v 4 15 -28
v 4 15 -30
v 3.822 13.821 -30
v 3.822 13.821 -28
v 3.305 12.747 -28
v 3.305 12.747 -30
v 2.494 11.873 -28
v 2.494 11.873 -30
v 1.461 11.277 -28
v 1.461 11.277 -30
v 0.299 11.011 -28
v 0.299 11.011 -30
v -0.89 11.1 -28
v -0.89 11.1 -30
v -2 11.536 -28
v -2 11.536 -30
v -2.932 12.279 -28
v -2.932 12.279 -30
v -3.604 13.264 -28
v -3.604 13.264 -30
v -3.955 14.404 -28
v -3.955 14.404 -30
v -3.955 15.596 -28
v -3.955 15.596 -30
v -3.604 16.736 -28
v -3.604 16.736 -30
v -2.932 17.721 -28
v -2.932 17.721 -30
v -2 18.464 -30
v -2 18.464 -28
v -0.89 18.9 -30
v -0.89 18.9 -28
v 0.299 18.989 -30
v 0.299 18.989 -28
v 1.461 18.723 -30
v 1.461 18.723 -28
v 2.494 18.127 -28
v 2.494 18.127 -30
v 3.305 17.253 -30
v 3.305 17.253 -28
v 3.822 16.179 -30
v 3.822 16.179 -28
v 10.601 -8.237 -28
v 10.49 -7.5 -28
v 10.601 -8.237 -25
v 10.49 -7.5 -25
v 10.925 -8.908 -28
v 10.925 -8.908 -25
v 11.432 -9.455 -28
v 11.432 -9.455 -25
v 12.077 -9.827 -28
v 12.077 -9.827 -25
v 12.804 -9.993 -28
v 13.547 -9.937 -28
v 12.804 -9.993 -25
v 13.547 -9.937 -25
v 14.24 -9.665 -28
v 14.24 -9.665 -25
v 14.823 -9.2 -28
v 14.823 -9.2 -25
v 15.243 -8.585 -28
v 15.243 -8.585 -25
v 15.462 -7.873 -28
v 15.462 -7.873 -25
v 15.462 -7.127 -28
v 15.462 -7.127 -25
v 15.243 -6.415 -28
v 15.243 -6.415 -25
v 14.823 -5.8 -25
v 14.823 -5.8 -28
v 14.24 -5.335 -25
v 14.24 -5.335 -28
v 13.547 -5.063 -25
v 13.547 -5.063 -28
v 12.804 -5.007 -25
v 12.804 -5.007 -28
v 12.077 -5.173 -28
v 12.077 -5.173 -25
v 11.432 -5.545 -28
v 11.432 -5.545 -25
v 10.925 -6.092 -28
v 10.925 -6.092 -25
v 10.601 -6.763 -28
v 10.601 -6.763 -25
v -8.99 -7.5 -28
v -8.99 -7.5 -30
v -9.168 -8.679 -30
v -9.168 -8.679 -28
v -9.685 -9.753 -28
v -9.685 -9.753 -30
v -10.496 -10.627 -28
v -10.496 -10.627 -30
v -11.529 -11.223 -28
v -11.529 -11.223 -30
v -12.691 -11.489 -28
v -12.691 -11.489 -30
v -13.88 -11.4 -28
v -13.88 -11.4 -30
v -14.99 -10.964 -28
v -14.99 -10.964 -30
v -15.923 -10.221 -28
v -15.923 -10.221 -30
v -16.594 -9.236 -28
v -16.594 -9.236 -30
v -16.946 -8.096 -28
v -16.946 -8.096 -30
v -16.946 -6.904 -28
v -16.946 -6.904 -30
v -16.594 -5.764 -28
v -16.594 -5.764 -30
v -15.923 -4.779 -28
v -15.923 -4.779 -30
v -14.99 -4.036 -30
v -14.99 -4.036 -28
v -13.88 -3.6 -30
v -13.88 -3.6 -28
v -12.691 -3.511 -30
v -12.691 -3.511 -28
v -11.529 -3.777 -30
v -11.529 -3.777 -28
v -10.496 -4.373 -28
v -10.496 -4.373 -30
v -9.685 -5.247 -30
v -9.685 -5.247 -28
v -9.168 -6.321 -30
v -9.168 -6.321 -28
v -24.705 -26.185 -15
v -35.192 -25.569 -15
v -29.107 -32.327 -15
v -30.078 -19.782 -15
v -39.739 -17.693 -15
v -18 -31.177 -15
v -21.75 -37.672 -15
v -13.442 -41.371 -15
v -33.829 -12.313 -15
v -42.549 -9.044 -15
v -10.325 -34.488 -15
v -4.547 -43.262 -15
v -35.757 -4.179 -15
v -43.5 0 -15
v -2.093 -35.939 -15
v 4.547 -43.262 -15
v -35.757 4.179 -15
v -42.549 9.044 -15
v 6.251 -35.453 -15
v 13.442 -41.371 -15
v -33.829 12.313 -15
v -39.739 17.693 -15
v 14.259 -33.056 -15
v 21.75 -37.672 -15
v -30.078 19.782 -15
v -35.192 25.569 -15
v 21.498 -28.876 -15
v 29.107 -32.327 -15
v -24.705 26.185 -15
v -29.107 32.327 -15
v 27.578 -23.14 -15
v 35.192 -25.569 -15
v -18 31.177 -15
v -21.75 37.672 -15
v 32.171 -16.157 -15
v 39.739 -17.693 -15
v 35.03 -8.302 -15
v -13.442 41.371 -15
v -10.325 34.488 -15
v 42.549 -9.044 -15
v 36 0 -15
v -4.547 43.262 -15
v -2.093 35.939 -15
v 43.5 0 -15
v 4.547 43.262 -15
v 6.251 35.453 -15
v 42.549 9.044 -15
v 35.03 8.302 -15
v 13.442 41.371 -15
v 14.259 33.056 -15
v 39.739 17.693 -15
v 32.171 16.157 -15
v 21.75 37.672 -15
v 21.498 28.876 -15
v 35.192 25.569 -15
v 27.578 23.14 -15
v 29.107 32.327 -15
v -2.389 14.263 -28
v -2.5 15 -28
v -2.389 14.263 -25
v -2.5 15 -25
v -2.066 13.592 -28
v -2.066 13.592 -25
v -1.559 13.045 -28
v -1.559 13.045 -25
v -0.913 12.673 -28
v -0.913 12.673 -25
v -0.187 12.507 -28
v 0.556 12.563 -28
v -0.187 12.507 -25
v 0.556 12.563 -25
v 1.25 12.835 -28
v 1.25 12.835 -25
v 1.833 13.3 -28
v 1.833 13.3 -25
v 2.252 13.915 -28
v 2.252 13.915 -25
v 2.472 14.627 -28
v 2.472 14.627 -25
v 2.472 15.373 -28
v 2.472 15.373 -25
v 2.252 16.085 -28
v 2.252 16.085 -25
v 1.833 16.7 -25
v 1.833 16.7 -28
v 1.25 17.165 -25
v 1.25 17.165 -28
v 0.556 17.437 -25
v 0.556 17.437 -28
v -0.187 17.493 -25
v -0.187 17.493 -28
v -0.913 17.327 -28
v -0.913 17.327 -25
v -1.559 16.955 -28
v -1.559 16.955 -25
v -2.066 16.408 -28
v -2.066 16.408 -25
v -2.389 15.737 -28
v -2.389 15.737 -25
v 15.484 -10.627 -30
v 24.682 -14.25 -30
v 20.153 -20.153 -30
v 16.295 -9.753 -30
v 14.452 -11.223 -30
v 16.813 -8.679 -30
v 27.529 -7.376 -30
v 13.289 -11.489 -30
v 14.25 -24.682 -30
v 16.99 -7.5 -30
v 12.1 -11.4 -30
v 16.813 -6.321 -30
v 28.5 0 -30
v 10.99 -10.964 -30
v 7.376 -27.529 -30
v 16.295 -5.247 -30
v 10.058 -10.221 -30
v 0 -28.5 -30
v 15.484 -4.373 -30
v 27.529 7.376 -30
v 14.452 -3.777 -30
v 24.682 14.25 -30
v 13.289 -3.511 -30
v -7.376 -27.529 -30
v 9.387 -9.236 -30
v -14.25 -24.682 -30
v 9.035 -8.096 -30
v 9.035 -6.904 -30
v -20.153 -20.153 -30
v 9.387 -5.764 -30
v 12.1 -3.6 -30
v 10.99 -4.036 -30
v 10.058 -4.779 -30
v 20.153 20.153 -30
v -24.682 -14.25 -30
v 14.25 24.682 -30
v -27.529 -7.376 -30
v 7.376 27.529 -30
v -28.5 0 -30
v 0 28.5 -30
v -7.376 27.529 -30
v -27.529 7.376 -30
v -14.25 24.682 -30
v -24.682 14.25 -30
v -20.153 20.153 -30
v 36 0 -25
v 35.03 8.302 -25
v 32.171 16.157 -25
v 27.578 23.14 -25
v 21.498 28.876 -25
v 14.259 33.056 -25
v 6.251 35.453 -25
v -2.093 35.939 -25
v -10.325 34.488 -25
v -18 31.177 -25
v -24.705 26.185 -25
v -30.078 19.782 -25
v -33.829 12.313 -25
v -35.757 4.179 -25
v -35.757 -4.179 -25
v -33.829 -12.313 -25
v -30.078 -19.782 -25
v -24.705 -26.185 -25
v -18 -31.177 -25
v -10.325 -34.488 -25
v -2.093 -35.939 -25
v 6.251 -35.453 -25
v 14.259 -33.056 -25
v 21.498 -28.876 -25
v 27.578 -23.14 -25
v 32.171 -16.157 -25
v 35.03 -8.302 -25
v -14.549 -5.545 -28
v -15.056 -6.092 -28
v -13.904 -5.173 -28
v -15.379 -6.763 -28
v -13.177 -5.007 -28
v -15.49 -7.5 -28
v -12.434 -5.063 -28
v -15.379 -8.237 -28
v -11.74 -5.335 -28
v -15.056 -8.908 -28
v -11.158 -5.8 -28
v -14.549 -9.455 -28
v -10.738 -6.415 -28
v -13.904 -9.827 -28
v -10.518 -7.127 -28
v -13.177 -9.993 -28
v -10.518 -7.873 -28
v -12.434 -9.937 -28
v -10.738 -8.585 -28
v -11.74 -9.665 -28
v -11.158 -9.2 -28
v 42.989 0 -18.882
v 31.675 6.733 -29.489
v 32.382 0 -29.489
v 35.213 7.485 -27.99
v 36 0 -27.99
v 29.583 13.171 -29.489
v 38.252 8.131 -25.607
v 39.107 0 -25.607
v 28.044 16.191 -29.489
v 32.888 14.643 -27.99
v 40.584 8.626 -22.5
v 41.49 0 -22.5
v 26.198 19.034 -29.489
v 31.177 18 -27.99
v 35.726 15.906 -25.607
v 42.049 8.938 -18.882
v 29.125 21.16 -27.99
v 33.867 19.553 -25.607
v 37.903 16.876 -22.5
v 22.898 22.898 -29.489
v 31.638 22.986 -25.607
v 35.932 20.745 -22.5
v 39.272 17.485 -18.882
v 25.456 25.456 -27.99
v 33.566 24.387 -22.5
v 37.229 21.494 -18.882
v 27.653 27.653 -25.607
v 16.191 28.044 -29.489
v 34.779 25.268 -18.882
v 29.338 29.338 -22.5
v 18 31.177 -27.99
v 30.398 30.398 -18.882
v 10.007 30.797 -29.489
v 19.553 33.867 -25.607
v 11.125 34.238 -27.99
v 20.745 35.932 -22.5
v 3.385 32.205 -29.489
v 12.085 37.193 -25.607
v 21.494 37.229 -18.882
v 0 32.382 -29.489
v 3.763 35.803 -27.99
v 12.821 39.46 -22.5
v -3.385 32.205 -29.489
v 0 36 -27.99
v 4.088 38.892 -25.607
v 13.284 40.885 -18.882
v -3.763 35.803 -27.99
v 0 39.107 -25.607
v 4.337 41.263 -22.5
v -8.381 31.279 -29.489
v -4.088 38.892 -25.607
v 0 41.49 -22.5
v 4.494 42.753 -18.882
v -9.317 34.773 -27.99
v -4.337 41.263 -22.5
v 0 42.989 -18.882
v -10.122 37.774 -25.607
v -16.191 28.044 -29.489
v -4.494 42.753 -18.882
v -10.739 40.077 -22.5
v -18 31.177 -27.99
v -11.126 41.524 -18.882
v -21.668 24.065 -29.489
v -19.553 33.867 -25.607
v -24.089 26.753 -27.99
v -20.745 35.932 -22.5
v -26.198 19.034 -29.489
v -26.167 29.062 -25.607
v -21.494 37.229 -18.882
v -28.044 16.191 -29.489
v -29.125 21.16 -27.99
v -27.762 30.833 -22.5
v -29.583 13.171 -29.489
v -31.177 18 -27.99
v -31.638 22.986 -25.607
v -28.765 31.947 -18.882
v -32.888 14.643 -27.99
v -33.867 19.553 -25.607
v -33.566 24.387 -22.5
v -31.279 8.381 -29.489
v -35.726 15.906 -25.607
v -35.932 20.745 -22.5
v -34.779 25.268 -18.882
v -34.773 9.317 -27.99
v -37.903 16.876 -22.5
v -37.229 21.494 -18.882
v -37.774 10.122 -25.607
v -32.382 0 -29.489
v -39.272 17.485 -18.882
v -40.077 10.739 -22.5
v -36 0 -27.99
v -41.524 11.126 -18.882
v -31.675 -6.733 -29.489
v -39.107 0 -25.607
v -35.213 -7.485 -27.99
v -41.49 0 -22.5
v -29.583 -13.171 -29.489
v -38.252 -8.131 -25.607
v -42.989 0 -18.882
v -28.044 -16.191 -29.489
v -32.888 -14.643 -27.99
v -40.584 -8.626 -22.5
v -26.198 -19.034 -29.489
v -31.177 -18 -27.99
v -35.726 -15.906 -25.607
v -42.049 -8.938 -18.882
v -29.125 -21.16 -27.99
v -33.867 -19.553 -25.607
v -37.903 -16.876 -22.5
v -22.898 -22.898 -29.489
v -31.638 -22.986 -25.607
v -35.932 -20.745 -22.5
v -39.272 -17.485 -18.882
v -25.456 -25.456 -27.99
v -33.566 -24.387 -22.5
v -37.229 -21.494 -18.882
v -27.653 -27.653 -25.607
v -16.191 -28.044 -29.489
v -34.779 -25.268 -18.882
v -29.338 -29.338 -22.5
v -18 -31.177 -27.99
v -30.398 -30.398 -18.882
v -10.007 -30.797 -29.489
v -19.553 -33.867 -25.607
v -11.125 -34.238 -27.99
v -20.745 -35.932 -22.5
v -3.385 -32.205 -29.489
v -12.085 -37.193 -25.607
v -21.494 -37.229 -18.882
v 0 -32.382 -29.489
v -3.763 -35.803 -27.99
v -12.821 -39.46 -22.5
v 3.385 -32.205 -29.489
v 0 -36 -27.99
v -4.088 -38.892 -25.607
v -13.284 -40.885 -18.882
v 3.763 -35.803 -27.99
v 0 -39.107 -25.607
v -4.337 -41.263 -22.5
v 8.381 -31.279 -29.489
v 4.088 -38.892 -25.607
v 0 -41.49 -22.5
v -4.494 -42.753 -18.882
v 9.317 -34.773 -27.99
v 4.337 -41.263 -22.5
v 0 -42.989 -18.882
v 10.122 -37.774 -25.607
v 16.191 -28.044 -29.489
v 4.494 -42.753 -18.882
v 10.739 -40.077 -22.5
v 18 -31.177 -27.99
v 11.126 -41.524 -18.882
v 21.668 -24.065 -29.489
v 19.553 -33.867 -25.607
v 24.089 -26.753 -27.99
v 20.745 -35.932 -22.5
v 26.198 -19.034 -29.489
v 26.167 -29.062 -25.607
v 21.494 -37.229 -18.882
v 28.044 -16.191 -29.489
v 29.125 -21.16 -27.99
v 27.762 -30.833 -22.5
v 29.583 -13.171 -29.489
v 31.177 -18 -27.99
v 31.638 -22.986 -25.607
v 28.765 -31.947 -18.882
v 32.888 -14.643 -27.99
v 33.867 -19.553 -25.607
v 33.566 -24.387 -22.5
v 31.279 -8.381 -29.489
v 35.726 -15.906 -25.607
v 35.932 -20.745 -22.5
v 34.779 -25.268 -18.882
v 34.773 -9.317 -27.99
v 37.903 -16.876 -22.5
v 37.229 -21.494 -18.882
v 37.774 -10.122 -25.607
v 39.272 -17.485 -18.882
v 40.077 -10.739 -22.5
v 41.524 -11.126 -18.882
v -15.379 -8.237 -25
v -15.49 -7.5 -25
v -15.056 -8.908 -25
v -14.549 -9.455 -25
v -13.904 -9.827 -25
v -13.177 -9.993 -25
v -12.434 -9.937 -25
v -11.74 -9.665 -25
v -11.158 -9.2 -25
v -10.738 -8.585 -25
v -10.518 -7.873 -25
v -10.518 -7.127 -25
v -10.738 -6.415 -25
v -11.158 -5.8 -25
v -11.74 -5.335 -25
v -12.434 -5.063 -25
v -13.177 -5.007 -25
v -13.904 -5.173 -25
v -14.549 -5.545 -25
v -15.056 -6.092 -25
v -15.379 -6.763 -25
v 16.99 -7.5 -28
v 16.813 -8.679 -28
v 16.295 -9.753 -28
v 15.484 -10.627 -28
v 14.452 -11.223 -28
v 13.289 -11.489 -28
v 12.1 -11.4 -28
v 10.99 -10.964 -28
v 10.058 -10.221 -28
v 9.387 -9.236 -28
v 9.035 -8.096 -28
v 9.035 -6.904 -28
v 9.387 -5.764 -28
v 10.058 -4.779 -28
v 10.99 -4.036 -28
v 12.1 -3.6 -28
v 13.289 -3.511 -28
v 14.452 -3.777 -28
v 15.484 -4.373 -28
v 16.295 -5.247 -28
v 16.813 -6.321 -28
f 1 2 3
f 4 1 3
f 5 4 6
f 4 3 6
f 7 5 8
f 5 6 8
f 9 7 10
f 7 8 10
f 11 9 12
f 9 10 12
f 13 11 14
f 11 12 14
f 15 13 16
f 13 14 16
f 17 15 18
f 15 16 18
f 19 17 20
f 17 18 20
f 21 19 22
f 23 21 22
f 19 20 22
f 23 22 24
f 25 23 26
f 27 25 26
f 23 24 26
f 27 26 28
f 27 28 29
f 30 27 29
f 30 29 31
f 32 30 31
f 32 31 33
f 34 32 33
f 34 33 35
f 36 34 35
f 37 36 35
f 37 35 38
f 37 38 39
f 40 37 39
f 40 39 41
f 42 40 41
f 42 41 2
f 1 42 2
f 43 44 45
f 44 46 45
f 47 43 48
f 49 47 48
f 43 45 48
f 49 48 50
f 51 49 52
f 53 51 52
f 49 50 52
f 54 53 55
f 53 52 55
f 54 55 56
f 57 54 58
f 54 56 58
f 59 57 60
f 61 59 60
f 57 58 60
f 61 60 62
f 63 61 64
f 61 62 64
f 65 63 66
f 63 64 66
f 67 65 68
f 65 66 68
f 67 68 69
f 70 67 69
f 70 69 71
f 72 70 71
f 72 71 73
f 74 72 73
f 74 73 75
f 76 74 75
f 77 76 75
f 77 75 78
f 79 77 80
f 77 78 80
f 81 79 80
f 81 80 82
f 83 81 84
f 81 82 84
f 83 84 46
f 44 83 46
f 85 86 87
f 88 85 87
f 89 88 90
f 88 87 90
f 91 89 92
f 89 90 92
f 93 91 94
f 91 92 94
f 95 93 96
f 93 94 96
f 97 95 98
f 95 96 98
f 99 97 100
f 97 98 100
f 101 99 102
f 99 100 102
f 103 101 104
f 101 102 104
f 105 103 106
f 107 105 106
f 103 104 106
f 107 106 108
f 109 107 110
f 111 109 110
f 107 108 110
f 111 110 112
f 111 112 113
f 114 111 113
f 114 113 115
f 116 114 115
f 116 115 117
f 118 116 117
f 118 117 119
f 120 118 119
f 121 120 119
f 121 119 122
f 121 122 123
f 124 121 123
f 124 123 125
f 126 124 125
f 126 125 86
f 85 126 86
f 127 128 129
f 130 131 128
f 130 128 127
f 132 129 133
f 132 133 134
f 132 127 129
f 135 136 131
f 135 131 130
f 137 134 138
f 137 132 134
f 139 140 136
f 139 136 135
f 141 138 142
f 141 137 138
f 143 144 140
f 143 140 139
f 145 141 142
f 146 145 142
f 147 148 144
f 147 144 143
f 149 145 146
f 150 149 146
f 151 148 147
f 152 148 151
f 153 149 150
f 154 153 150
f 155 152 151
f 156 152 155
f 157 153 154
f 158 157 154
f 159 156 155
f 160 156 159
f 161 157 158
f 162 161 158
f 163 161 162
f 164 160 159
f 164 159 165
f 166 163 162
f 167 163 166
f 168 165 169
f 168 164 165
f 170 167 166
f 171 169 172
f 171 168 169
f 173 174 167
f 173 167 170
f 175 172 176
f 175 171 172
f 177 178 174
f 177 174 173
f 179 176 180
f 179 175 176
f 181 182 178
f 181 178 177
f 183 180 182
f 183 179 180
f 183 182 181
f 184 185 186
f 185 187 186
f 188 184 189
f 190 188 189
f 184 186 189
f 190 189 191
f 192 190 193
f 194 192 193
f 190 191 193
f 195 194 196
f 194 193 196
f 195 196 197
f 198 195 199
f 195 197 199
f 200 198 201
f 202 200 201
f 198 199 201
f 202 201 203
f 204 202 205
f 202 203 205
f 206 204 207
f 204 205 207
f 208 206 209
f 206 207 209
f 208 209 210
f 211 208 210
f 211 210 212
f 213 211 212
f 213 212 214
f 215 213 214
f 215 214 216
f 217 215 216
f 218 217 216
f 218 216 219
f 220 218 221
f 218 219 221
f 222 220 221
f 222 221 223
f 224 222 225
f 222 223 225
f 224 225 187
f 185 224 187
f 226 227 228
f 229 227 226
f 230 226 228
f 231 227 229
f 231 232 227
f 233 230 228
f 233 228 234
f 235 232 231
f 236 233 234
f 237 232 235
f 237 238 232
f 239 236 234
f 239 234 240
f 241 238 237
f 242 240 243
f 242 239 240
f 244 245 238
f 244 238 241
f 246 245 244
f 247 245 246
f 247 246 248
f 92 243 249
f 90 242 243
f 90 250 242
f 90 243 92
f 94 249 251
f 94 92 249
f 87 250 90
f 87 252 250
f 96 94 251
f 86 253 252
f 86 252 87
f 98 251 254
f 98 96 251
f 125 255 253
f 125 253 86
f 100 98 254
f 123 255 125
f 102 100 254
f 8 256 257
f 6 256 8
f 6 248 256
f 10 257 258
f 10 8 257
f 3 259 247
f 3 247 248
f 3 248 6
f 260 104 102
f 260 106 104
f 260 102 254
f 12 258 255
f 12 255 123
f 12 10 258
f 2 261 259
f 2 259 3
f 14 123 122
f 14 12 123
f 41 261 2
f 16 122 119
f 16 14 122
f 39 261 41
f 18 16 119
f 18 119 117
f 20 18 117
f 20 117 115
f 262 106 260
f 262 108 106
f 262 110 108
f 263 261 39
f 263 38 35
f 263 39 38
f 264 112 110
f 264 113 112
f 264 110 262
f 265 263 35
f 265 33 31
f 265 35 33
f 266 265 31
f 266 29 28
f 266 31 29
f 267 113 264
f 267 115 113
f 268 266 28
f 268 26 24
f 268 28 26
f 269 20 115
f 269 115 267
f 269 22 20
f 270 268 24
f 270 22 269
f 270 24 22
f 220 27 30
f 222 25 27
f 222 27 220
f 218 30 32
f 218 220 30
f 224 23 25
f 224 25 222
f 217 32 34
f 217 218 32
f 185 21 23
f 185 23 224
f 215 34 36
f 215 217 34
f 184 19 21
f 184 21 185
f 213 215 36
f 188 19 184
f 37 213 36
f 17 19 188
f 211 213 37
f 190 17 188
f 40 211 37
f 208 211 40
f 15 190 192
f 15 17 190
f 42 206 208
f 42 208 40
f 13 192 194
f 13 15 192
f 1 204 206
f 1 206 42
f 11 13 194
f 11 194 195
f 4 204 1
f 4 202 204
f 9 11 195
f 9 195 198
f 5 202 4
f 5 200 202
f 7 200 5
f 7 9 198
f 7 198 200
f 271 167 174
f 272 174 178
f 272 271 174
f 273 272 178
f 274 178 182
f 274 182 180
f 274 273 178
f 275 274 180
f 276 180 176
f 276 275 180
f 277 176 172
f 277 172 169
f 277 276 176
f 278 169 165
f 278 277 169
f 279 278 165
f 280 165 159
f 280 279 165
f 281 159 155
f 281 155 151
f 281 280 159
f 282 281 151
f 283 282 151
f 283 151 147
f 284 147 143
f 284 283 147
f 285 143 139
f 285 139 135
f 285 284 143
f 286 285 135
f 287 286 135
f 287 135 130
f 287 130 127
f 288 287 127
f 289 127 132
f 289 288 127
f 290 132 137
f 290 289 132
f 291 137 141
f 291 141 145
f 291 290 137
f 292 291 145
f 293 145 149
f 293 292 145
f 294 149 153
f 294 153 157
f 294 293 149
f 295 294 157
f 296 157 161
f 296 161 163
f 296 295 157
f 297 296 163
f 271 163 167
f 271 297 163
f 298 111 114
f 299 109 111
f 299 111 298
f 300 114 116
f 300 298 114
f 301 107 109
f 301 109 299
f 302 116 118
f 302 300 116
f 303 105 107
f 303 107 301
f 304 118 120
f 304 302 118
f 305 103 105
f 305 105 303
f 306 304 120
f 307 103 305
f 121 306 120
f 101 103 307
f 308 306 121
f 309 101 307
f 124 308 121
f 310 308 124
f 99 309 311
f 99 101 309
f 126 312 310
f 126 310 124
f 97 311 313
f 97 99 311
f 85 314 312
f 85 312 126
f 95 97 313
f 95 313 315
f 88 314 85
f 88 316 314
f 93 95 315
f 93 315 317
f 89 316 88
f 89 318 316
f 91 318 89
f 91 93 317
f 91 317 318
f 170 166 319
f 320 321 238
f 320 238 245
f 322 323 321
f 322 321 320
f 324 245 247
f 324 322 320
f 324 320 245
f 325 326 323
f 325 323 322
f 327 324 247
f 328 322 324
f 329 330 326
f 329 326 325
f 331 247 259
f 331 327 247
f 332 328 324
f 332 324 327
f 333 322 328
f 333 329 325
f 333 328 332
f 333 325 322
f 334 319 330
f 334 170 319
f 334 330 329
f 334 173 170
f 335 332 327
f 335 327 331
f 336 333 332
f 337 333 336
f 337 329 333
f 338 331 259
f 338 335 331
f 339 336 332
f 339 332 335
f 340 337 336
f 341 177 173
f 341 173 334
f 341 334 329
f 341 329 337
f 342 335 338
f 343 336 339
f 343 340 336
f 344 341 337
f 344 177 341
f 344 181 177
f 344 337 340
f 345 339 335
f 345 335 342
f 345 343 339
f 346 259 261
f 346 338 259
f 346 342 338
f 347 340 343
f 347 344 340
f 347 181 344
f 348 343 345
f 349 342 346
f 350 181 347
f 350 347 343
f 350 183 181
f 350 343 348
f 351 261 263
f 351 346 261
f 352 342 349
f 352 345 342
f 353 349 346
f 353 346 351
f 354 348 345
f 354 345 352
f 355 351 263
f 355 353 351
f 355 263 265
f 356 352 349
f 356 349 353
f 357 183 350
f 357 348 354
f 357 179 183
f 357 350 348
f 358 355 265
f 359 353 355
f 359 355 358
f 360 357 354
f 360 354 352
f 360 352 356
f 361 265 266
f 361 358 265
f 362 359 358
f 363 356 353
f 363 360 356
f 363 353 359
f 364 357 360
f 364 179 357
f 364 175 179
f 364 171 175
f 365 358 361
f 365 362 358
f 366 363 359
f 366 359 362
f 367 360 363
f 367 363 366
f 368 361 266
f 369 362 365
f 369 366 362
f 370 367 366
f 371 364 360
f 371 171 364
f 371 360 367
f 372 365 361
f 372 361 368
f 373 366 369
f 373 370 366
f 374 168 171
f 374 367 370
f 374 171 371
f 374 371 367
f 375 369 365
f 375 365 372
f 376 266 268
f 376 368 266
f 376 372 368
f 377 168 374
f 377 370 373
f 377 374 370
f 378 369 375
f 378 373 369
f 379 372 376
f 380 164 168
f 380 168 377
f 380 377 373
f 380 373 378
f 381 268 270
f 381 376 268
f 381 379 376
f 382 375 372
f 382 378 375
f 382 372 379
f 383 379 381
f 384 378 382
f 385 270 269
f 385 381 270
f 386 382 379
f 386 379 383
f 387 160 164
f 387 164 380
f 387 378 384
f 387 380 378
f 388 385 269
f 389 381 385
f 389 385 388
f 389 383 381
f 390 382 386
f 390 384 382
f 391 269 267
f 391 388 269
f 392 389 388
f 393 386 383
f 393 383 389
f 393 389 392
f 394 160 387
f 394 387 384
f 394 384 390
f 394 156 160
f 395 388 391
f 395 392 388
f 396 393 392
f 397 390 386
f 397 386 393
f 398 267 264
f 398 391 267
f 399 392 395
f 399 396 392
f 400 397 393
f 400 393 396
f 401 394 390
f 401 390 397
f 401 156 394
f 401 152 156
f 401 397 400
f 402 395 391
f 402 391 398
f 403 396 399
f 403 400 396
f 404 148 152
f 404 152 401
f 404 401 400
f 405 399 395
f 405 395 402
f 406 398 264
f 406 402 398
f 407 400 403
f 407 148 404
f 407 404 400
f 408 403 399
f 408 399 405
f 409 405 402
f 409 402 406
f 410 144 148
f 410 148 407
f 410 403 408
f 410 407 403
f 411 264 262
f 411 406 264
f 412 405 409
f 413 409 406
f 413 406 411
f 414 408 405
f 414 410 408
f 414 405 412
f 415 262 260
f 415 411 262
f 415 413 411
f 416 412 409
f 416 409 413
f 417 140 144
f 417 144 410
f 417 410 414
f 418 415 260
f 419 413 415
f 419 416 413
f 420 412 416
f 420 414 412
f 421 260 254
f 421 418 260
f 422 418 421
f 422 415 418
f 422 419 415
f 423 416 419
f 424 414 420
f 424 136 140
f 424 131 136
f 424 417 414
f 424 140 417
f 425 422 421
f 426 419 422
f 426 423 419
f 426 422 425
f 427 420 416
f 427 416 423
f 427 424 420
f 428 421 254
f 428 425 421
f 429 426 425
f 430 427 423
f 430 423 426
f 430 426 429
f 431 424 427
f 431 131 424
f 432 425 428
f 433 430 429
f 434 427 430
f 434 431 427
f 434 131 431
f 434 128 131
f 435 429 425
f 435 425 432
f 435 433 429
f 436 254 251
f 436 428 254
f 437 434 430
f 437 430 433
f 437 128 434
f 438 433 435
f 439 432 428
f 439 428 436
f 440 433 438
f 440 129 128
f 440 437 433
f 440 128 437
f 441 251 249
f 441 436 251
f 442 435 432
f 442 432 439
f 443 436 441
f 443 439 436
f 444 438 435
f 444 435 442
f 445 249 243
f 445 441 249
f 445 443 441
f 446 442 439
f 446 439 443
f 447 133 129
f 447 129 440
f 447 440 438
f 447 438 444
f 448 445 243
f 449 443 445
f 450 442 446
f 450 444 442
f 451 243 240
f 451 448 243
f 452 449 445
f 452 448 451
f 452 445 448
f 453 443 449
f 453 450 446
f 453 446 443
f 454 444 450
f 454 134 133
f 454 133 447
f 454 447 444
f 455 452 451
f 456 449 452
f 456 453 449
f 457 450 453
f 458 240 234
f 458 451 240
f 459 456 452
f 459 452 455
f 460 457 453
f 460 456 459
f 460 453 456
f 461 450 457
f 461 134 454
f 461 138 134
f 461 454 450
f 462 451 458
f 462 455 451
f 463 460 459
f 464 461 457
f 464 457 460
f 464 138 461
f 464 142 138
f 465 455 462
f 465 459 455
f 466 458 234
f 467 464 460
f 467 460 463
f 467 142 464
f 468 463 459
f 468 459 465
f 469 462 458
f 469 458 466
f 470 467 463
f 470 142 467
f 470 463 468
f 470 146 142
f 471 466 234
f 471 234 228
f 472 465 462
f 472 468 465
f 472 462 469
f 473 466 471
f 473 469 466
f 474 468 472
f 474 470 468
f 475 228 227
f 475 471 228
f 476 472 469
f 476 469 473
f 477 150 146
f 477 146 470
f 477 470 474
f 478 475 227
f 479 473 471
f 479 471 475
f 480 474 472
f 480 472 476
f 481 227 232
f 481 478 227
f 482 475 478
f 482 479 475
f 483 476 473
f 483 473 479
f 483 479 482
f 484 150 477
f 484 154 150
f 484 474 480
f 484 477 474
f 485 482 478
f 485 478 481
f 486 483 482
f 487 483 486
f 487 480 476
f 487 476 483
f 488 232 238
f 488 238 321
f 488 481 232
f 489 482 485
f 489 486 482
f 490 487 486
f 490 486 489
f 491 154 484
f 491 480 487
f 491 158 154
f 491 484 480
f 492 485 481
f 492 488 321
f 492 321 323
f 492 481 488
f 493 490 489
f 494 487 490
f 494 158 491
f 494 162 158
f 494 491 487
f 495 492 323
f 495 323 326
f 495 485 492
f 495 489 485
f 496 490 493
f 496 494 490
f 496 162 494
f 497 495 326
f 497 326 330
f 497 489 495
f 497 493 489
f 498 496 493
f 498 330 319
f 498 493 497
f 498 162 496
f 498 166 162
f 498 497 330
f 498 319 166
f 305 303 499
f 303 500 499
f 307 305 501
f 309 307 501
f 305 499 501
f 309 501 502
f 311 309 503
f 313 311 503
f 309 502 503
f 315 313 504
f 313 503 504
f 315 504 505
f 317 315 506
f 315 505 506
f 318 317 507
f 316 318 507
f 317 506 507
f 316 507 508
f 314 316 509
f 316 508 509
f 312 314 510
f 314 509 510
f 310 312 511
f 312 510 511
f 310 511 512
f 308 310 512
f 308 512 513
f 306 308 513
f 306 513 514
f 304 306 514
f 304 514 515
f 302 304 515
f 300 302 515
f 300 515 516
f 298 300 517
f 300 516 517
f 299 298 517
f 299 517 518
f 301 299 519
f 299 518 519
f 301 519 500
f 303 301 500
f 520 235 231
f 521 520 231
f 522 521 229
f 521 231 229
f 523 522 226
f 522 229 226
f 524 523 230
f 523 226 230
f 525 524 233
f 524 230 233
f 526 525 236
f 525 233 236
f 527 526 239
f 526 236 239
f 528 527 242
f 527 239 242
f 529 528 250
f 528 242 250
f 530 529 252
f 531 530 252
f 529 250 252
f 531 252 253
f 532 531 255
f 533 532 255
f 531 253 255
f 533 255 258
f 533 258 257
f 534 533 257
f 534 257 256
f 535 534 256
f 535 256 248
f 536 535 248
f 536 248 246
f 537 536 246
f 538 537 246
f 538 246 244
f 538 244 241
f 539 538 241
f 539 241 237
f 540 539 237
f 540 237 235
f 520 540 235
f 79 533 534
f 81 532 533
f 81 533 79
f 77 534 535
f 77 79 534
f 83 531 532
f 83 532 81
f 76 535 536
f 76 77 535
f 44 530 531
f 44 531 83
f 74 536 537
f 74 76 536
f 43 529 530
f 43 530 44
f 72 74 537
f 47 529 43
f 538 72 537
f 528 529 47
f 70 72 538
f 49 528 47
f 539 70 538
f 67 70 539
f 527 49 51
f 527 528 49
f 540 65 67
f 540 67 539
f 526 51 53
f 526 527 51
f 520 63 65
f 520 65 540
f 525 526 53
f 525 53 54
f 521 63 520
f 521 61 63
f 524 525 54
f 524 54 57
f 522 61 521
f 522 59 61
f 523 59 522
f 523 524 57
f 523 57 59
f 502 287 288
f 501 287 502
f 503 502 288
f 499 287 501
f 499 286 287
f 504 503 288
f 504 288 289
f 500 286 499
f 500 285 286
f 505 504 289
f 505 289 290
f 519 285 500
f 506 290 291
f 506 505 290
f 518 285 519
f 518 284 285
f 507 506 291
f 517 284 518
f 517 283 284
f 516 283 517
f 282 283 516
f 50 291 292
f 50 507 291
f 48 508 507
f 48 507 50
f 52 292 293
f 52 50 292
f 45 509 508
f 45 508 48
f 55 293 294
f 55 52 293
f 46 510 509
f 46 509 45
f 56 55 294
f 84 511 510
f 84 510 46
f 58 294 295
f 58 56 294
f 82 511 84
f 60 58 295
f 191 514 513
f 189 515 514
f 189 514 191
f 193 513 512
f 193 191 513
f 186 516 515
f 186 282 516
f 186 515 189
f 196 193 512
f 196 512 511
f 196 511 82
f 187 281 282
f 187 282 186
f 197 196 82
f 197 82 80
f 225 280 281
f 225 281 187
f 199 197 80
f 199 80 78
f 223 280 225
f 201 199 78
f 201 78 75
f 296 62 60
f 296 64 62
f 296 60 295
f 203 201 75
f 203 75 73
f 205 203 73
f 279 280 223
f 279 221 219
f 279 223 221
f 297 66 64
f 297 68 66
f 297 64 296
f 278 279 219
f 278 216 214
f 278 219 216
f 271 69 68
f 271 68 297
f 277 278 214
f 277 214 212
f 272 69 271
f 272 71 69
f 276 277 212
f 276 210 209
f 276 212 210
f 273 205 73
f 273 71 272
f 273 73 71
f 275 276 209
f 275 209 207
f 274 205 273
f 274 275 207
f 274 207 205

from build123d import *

# Parameters (mm, degrees)
F2_R           = 14.99999
F4_D           = 5
F4_CBORE_D     = 8
F4_CBORE_DEPTH = 2


# Not quite as in the source:
# - a fillet or chamfer is up to 0.001 mm smaller than in the source, because OpenCascade refuses the exact size


with BuildPart() as f1:
    # F0 (on Front) → F1 (revolve)
    with BuildSketch(Plane.XZ):
        Polygon((36, -25), (0, -25), (0, -30), (43.5, -30), (43.5, -15), (36, -15), align=None)
    revolve(axis=Axis((0, 0, -27.5), (0, 0, 1)))

    # F2 (radius 15 in the source; OpenCascade refuses exactly that, so slightly less here)
    f2_edges = [f1.edges().sort_by_distance(p)[0] for p in [
        (-43.5, 0, -30),
    ]]
    fillet(f2_edges, radius=F2_R)

    # F4 (through all)
    with Locations(Plane(origin=(0, 0, -30), x_dir=(1, 0, 0), z_dir=(0, 0, -1))):
        with Locations((-12.9903810568, 7.5), (12.9903810568, 7.5), (0, -15)):
            CounterBoreHole(F4_D / 2, F4_CBORE_D / 2, F4_CBORE_DEPTH)


solid = f1.part
